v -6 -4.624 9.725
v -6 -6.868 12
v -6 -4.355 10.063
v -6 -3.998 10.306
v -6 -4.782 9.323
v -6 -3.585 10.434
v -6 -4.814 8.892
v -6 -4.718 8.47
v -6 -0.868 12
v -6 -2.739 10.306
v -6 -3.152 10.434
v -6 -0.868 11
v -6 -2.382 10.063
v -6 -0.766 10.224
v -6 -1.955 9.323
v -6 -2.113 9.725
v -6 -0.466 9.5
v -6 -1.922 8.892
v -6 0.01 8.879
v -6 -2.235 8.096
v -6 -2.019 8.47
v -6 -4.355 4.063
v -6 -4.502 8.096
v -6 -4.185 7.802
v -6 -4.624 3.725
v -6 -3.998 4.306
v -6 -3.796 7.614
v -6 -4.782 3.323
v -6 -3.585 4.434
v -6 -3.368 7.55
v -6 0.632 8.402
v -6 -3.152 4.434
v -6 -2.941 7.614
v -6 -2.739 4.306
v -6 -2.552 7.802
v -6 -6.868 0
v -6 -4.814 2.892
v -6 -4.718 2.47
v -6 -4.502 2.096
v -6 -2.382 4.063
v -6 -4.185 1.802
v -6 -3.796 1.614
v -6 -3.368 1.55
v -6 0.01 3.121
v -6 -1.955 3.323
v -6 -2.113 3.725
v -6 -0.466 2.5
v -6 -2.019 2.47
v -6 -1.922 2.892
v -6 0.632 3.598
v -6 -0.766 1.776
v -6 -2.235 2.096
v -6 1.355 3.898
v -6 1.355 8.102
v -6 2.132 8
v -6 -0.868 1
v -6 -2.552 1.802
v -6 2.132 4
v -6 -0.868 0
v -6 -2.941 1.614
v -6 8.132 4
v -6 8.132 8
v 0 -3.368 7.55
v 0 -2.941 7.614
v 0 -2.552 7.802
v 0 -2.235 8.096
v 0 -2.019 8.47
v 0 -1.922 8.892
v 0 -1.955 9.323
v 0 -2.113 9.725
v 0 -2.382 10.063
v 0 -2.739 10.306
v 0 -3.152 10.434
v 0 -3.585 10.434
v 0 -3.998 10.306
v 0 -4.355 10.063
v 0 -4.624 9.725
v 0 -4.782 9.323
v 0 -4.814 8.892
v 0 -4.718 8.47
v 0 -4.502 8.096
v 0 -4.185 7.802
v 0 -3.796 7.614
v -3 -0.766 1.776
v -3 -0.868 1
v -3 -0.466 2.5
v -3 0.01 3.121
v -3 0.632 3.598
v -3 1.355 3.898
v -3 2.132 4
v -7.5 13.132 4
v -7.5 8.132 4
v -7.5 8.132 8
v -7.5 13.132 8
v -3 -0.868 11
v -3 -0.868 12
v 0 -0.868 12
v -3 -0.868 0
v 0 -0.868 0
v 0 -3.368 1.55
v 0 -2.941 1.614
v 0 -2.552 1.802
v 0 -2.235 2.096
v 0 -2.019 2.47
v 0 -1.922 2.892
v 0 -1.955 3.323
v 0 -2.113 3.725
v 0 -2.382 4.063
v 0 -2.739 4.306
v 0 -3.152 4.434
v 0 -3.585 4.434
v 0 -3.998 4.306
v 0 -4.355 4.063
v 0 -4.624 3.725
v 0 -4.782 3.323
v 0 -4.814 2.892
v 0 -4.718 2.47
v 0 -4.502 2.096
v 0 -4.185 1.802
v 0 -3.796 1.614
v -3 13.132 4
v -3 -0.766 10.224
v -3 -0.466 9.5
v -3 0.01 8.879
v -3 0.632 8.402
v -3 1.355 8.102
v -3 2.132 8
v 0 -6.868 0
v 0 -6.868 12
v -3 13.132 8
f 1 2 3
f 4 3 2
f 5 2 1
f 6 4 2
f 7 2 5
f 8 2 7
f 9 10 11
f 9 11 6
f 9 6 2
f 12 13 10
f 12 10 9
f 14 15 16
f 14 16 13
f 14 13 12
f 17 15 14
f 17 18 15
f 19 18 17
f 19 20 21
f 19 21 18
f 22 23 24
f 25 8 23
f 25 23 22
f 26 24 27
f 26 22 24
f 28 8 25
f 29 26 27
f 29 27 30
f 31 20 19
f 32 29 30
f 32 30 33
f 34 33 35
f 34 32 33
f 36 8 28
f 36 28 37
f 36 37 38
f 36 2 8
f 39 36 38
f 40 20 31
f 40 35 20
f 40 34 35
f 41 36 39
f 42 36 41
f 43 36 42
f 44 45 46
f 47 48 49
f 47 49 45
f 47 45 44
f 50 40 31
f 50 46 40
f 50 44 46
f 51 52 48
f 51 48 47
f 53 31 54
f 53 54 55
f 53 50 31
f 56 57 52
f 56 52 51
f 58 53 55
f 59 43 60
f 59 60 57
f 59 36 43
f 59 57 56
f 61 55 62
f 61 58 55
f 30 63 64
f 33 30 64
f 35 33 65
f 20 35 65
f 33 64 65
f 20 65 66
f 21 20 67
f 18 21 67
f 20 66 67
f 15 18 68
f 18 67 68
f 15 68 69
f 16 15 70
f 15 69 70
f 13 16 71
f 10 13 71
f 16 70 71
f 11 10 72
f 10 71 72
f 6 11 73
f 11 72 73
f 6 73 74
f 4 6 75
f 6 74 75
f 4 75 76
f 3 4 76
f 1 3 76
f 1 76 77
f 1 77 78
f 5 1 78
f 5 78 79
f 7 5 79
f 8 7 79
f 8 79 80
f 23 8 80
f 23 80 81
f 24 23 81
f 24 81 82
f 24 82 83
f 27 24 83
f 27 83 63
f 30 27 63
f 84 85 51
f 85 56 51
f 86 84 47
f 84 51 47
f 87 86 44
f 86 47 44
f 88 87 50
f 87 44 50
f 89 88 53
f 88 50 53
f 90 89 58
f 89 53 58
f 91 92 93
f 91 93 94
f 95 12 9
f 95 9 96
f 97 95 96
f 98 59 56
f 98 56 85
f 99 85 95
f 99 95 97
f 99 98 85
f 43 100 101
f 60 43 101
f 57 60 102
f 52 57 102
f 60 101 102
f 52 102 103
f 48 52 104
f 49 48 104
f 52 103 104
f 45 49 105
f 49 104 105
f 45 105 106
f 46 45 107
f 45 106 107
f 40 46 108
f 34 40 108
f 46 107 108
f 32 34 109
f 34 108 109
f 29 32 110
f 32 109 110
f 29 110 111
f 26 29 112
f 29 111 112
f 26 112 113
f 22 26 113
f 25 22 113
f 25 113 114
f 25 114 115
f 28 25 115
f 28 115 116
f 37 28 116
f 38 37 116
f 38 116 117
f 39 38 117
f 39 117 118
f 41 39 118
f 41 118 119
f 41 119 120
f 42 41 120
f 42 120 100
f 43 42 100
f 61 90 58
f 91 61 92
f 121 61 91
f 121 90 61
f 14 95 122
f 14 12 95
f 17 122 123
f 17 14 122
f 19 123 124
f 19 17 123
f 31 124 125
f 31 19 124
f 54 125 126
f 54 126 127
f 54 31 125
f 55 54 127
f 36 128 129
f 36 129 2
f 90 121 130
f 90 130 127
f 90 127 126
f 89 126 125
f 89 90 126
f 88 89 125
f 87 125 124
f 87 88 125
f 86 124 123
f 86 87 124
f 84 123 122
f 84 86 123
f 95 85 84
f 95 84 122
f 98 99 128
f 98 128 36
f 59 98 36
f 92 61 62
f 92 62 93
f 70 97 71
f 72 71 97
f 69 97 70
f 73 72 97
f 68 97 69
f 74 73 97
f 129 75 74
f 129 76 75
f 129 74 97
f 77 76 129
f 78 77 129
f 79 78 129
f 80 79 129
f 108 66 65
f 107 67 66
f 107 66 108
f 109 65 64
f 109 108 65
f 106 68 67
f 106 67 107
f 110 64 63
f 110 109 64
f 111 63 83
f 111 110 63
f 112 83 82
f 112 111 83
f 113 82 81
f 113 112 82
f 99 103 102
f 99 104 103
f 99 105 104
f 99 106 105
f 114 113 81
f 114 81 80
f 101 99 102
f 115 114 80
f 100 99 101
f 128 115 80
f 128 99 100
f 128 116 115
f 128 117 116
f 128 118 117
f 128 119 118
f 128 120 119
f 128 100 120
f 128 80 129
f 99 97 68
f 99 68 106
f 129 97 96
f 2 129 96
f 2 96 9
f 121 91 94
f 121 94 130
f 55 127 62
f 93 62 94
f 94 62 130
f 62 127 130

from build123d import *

# Parameters (mm, degrees)
BOSS_EXTRUDE1_DEPTH    = 12
SKETCH2_W              = 4.936858862
SKETCH2_H              = 15.079572613
SKETCH2_W_2            = 5.292899171
CUT_EXTRUDE1_DEPTH     = 19.349069885
FILLET1_R              = 3
M2_5_CLEARANCE_HOLE1_D = 2.9


with BuildPart() as part:
    # Sketch1 → Boss-Extrude1 (new body)
    with BuildSketch(Plane.XY):
        Polygon((0, -6.868421053), (-6, -6.868421053), (-6, 8.131578947), (-7.5, 8.131578947), (-7.5, 13.131578947), (-3, 13.131578947), (-3, -0.868421053), (0, -0.868421053), align=None)
    extrude(amount=BOSS_EXTRUDE1_DEPTH)

    # Sketch2 → Cut-Extrude1 (cut, through all)
    with BuildSketch(Plane(origin=(-3, 0, 0), x_dir=(0, 0, -1), z_dir=(1, 0, 0))):
        with Locations((-10.468429431, 6.671365254)):
            Rectangle(SKETCH2_W, SKETCH2_H)
        with Locations((-1.353550414, 6.671365254)):
            Rectangle(SKETCH2_W_2, SKETCH2_H)
    extrude(amount=-CUT_EXTRUDE1_DEPTH, mode=Mode.SUBTRACT)

    # Fillet1
    fillet1_edges = [part.edges().sort_by_distance(p)[0] for p in [
        (-4.5, -0.868421053, 8),
        (-4.5, -0.868421053, 4),
    ]]
    fillet(fillet1_edges, radius=FILLET1_R)

    # M2.5 Clearance Hole1 (through all)
    with Locations(Plane.ZY.offset(6)):
        with Locations((3, -3.368421053), (9, -3.368421053)):
            Hole(M2_5_CLEARANCE_HOLE1_D / 2)


solid = part.part
